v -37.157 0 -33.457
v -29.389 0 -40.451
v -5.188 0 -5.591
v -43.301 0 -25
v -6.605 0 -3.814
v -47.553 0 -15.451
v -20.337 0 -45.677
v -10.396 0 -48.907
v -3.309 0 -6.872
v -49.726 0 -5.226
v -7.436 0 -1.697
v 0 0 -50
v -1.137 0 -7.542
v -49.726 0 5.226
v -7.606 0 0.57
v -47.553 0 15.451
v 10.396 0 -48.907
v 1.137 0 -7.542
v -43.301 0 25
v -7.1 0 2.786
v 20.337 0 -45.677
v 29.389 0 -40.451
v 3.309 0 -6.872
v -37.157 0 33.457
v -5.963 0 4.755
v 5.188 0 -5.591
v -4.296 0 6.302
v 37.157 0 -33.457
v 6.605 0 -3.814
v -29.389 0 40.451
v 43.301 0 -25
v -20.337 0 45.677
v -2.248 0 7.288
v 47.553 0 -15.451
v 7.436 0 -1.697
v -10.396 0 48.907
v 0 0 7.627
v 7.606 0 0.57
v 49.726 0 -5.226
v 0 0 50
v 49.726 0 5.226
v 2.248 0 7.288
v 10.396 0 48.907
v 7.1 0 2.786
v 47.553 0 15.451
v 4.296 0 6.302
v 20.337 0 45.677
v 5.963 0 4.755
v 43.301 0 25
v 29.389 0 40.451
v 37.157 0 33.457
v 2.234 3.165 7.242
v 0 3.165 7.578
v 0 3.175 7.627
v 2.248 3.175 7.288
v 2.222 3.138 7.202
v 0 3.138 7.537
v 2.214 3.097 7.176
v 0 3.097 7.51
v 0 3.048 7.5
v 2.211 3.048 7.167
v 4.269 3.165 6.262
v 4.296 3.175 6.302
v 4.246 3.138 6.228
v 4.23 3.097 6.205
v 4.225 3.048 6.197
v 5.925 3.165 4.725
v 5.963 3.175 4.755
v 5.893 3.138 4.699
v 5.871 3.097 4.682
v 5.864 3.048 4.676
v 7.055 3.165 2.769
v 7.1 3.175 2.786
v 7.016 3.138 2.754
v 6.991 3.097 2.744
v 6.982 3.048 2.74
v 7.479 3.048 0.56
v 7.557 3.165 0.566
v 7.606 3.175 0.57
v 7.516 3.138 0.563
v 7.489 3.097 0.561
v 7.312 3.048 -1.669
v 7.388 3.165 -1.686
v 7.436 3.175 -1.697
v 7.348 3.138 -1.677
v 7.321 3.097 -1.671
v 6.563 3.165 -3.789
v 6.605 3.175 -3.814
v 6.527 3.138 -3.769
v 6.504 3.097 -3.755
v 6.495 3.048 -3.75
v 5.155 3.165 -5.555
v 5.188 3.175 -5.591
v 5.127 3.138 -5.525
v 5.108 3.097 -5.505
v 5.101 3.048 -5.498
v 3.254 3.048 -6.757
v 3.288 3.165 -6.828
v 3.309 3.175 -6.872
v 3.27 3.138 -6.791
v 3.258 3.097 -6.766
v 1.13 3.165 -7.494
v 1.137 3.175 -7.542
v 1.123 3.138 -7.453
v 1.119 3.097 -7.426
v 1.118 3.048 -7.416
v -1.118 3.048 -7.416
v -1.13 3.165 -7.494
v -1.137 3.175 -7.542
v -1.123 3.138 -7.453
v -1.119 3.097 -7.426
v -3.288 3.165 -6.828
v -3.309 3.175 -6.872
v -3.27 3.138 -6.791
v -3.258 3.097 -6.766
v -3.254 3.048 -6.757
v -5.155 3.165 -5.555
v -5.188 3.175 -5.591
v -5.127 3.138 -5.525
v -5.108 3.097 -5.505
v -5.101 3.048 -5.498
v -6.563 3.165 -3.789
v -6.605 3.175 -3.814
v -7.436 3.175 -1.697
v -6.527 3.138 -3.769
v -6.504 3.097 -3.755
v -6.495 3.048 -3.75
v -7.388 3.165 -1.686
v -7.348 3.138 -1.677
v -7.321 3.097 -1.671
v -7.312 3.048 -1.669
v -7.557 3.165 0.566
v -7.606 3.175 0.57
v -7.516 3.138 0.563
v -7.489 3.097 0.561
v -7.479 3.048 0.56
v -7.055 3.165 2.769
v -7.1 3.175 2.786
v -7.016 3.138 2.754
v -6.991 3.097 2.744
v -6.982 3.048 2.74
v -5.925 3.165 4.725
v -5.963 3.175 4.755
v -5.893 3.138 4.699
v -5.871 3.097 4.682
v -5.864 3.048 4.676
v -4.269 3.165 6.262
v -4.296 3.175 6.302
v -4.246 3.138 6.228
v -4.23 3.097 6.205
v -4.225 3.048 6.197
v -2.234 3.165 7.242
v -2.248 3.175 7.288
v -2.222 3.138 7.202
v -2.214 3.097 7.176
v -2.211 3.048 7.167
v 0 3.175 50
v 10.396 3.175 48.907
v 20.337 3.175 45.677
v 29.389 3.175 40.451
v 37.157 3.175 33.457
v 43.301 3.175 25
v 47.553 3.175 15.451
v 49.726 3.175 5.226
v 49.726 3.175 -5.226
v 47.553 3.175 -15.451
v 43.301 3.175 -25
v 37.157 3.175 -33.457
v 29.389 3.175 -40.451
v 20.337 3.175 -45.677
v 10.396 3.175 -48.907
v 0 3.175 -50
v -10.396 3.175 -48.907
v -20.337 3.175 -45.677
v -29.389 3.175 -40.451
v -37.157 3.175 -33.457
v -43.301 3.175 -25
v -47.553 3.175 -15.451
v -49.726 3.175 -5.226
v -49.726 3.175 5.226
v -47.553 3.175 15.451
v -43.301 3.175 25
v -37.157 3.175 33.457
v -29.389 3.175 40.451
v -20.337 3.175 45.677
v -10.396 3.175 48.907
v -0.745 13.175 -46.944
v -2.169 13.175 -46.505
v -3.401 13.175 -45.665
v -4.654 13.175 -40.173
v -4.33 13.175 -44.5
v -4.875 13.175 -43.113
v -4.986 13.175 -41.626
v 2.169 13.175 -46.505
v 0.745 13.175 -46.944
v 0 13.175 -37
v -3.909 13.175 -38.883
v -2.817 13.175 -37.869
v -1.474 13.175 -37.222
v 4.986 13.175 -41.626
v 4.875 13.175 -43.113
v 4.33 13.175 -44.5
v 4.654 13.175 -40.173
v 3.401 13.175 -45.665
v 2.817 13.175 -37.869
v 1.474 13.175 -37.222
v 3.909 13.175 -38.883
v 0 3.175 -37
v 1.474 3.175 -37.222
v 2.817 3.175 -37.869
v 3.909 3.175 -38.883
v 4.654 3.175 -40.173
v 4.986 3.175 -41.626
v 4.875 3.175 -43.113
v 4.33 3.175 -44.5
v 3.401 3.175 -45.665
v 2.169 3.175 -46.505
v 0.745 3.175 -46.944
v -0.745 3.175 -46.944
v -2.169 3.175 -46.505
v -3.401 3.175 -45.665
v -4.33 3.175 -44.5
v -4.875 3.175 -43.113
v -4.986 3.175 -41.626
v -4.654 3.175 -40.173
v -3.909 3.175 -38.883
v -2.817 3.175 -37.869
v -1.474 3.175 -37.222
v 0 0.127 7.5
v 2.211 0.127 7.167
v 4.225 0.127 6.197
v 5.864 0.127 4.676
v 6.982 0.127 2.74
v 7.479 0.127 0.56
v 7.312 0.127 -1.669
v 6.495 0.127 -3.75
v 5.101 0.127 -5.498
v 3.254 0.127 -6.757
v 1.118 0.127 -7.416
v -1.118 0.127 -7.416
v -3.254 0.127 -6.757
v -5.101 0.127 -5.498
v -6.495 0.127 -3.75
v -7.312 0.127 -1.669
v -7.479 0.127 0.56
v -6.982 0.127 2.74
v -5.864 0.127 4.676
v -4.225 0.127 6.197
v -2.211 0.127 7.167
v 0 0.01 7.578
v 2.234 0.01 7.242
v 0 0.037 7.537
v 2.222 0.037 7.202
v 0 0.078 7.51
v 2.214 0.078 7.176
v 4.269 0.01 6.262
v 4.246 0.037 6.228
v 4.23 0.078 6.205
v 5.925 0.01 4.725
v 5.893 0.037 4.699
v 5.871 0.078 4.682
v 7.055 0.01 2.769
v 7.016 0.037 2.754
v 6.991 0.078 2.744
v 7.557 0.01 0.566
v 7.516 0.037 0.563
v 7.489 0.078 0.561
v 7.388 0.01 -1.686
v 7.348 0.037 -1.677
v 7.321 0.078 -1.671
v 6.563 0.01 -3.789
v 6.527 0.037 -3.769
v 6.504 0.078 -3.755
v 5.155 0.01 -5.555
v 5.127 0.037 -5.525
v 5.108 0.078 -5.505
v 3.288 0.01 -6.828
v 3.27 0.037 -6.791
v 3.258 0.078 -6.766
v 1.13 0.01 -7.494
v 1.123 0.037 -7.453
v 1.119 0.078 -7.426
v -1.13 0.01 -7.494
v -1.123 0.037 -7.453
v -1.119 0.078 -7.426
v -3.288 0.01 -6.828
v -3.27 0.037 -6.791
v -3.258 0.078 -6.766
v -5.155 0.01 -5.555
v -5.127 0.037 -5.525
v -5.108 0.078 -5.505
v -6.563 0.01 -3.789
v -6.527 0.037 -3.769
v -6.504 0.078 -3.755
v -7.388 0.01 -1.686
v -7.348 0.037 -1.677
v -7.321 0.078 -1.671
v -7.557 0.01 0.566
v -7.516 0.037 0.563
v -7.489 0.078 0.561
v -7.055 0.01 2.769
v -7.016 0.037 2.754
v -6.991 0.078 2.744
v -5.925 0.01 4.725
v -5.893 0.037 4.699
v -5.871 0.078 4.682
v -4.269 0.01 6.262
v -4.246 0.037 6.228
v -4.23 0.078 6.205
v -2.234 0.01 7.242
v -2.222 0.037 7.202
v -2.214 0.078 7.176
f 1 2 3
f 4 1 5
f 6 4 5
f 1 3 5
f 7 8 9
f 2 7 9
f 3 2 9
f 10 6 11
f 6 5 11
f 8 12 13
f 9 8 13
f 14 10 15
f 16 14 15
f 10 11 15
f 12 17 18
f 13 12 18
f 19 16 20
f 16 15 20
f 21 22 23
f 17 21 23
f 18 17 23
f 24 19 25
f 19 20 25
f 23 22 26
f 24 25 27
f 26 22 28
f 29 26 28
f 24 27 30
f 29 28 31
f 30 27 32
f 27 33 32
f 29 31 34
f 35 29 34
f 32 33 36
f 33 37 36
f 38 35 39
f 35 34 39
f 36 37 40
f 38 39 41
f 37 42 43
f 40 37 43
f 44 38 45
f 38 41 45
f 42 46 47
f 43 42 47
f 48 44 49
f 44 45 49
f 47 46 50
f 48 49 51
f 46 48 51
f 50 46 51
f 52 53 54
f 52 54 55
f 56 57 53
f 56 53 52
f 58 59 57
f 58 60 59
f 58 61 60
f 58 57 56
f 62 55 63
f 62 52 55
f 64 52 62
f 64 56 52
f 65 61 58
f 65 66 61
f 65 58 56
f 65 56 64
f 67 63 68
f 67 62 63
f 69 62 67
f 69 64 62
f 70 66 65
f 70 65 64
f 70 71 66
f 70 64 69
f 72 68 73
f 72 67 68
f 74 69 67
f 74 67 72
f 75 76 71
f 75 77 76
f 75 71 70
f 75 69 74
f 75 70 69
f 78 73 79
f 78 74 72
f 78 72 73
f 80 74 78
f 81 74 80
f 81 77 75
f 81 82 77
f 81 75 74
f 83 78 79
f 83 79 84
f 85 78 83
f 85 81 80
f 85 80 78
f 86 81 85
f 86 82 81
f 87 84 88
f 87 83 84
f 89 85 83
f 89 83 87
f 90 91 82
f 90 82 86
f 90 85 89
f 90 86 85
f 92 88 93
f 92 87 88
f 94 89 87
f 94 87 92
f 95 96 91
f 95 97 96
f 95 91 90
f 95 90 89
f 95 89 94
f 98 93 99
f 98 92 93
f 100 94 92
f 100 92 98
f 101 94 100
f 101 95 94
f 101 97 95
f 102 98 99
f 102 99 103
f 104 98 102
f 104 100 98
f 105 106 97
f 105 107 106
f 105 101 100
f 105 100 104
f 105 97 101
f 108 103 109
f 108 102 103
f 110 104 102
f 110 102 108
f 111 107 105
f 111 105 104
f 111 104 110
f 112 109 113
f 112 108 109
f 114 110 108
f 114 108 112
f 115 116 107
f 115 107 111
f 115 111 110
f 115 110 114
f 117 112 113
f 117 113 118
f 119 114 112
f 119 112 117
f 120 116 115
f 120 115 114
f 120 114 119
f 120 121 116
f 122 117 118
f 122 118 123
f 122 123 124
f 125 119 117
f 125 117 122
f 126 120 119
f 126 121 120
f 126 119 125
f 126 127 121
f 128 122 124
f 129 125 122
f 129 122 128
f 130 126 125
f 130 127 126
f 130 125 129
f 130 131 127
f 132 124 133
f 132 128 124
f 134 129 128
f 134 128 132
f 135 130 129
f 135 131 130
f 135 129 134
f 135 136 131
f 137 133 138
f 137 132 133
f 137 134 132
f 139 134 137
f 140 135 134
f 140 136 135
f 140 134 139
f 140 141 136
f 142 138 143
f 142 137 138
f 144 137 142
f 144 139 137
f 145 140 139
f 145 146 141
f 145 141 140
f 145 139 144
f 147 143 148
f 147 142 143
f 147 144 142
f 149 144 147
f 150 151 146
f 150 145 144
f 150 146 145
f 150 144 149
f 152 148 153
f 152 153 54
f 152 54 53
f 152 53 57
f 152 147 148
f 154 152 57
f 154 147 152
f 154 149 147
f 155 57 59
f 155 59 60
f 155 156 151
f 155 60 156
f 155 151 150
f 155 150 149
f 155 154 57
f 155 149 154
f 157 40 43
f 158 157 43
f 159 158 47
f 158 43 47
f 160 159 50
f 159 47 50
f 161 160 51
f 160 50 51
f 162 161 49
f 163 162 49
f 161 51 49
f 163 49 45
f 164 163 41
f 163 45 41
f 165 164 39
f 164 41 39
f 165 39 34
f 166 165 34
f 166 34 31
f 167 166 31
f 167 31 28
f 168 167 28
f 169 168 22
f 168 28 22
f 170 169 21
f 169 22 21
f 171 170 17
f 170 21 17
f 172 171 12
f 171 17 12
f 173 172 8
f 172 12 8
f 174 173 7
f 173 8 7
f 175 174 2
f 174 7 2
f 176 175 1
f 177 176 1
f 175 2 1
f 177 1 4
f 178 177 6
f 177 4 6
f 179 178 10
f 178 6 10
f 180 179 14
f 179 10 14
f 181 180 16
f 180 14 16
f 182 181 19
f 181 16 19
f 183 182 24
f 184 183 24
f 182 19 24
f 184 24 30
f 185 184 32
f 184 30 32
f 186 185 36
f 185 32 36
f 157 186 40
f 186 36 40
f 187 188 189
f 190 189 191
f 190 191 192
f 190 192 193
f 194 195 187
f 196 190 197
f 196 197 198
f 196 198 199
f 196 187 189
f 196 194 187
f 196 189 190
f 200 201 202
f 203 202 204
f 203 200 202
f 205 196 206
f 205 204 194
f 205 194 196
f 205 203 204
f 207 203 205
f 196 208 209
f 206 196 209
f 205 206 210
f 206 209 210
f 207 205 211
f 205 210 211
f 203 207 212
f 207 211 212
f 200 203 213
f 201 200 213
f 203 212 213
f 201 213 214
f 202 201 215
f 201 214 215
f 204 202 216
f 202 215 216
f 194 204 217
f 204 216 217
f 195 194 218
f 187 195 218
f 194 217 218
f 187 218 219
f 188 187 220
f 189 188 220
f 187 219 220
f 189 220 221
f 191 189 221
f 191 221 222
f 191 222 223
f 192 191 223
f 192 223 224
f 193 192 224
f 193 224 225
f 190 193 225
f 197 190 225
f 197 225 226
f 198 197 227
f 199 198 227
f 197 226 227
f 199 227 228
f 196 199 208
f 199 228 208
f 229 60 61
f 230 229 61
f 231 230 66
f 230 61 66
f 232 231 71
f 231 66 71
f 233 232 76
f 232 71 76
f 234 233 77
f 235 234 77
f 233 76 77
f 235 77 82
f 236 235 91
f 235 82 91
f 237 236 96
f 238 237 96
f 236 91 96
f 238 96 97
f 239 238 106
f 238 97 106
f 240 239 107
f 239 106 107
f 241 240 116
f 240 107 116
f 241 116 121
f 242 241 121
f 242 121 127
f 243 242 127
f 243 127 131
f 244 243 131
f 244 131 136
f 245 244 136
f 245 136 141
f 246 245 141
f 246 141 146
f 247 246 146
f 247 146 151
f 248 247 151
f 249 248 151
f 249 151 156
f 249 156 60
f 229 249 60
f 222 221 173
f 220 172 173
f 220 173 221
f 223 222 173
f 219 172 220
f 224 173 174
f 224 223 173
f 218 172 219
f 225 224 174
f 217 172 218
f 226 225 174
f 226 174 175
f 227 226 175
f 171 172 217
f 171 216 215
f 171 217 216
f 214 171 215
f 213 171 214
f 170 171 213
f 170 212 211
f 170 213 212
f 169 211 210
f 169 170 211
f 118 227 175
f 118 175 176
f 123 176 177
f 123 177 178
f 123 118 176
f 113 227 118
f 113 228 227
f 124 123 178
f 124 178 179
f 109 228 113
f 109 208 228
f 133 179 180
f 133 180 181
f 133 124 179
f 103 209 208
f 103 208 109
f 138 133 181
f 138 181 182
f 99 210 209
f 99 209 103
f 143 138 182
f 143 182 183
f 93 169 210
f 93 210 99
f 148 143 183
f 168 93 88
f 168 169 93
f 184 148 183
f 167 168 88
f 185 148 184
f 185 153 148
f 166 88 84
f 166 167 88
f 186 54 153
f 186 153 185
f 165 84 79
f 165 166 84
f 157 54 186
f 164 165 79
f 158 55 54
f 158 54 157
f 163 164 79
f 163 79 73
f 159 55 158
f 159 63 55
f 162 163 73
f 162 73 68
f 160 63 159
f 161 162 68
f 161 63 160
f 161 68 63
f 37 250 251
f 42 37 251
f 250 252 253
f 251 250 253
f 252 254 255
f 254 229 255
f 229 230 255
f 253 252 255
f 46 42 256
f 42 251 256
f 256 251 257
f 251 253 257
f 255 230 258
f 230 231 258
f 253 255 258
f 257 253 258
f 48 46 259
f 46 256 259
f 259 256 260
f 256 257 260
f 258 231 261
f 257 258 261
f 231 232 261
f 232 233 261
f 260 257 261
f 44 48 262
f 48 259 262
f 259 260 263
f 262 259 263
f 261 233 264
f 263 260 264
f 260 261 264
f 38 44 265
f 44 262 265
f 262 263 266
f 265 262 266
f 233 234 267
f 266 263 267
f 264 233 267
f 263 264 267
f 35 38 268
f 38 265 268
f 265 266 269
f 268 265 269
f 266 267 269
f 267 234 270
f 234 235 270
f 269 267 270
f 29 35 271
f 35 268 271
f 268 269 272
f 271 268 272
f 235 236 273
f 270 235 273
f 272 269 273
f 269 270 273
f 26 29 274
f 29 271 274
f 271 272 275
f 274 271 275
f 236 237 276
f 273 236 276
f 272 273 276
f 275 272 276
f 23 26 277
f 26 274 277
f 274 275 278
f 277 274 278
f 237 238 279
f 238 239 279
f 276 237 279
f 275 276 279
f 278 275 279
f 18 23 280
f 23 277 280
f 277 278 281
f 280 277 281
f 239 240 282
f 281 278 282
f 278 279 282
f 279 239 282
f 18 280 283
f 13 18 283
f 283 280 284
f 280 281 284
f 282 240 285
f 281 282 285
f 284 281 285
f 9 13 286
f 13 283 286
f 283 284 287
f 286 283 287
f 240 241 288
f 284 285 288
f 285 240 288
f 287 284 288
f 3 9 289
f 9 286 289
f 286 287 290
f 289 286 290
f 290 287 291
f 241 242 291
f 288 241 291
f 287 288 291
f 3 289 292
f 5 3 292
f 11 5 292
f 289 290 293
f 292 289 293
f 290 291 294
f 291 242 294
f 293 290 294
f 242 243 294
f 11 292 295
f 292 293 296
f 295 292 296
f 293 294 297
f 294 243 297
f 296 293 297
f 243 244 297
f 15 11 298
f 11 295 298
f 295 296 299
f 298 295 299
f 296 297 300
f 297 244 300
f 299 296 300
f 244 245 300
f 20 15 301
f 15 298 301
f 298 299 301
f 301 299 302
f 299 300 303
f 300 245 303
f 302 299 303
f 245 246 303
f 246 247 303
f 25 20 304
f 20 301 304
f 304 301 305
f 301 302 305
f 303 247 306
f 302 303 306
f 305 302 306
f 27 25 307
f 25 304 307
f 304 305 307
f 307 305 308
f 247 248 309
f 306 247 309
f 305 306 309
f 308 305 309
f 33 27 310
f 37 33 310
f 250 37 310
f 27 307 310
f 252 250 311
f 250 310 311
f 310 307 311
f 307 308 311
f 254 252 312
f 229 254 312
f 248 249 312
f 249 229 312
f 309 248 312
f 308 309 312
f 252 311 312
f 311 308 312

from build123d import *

# Parameters (mm, degrees)
SKETCH1_R           = 50
BOSS_EXTRUDE1_DEPTH = 3.175
SKETCH3_R           = 7.5
CUT_EXTRUDE1_DEPTH  = 71.78192301
FILLET3_R           = 0.127
SKETCH4_R           = 5
BOSS_EXTRUDE2_DEPTH = 10


with BuildPart() as part:
    # Sketch1 → Boss-Extrude1 (new body)
    with BuildSketch(Plane(origin=(0, 0, 0), x_dir=(1, 0, 0), z_dir=(0, 1, 0))):
        Circle(SKETCH1_R)
    extrude(amount=BOSS_EXTRUDE1_DEPTH)

    # Sketch3 → Cut-Extrude1 (cut, through all)
    with BuildSketch(Plane(origin=(0, 3.175, 0), x_dir=(1, 0, 0), z_dir=(0, 1, 0))):
        Circle(SKETCH3_R)
    extrude(amount=-CUT_EXTRUDE1_DEPTH, mode=Mode.SUBTRACT)

    # Fillet3
    fillet3_edges = [part.edges().sort_by_distance(p)[0] for p in [
        (-7.5, 0, 0),
        (-7.5, 3.175, 0),
    ]]
    fillet(fillet3_edges, radius=FILLET3_R)

    # Sketch4 → Boss-Extrude2 (add)
    with BuildSketch(Plane(origin=(0, 3.175, 0), x_dir=(1, 0, 0), z_dir=(0, 1, 0))):
        with Locations((0, 42)):
            Circle(SKETCH4_R)
    extrude(amount=BOSS_EXTRUDE2_DEPTH)


solid = part.part
